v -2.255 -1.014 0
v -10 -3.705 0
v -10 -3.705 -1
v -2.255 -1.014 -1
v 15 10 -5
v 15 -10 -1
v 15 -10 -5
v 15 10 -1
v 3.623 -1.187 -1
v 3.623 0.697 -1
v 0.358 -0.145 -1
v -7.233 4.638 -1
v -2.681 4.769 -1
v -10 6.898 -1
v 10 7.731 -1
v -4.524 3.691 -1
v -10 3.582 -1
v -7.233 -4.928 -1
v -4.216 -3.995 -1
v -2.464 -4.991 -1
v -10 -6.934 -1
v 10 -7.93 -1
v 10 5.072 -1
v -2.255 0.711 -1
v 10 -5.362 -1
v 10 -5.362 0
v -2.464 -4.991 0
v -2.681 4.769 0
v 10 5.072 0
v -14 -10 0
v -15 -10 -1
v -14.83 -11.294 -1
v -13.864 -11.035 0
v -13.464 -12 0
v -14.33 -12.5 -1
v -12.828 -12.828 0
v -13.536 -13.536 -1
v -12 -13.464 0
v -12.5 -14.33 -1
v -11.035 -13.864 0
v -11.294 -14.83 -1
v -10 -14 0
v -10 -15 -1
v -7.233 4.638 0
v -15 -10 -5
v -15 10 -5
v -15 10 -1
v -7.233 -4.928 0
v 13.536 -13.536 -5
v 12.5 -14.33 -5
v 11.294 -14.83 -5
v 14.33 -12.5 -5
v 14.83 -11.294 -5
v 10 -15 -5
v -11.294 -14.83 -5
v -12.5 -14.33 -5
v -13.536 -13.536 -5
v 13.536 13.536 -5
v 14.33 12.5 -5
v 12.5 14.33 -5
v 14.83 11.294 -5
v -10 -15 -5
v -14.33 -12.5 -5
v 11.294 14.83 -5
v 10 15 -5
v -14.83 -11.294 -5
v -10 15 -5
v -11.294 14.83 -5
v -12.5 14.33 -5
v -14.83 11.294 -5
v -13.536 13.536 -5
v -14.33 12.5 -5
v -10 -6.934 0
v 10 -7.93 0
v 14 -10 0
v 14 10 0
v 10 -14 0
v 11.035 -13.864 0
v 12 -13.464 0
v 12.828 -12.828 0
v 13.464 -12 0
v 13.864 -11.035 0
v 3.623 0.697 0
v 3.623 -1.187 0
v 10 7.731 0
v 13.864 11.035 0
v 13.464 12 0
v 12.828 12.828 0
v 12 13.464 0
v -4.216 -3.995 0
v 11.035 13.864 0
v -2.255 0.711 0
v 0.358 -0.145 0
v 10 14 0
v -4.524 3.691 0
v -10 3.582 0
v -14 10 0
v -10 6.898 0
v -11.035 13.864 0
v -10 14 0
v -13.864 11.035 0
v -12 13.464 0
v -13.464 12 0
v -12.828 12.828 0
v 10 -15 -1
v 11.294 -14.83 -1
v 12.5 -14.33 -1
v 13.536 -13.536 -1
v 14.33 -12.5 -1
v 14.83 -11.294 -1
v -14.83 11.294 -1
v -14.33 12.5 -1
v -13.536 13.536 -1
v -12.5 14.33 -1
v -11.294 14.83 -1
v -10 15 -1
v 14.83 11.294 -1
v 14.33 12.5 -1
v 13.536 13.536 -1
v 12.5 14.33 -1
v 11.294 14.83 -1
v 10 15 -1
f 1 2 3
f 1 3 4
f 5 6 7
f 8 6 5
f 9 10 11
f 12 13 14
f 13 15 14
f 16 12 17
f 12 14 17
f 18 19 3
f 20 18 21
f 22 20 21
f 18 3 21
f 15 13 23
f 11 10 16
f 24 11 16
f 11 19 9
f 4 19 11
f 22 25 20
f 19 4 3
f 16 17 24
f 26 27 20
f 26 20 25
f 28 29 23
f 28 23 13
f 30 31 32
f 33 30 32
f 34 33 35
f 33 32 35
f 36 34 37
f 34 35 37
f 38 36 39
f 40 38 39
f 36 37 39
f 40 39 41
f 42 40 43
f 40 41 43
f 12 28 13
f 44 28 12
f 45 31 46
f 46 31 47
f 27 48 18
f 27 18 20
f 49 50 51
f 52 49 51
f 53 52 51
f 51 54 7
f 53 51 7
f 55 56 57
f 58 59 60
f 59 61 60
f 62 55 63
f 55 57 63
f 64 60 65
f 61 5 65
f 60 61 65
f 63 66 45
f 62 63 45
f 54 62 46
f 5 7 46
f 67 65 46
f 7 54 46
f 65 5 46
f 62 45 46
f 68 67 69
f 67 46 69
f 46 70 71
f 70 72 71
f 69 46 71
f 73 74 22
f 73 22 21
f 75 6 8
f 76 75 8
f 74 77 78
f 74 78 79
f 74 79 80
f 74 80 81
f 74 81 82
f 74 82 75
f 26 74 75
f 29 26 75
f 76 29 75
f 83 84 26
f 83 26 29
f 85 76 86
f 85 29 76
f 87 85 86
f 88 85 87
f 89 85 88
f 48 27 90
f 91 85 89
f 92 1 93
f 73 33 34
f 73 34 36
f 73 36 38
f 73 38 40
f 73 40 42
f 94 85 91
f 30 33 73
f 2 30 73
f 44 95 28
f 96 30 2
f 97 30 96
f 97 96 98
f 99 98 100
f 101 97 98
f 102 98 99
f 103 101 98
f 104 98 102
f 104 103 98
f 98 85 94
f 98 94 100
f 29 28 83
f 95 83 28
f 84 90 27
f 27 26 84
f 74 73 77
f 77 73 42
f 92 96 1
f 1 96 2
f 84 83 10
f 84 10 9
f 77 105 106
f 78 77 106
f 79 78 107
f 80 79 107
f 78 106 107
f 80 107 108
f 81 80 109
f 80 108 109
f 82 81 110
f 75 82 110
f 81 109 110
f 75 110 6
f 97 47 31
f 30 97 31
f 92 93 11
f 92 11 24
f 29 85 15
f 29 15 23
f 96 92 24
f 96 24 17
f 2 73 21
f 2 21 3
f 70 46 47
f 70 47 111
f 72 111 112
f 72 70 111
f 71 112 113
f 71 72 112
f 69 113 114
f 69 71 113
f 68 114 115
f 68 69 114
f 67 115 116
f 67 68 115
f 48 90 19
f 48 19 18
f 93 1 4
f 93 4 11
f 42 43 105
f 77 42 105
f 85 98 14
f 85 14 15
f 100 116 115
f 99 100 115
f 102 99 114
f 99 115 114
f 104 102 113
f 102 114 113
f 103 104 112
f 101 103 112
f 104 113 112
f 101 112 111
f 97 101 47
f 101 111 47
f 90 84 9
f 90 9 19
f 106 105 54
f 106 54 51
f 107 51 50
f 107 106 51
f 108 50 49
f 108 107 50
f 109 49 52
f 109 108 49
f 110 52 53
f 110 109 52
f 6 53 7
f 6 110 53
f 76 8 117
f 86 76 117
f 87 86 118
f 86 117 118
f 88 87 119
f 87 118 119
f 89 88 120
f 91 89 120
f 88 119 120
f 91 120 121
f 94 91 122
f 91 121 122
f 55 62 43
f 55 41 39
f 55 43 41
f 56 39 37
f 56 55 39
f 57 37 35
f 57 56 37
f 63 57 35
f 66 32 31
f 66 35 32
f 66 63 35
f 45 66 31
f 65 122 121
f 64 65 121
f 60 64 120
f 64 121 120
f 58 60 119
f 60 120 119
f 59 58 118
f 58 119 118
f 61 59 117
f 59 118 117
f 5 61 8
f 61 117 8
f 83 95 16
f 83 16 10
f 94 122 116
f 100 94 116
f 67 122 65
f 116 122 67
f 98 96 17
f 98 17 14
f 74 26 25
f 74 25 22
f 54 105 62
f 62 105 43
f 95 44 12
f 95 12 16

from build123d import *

# Parameters (mm, degrees)
SKETCH1_W             = 30
SKETCH1_H             = 30
BOSS_EXTRUDE1_DEPTH   = 5
SKETCH1_3_OUTSIDE_W   = 40.544
SKETCH1_3_OUTSIDE_H   = 40.544
SKETCH1_3_OUTSIDE_W_2 = 30
SKETCH1_3_OUTSIDE_H_2 = 30
CUT_EXTRUDE1_DEPTH    = 1
FILLET1_R             = 5
CHAMFER1_SIZE         = 1


with BuildPart() as part:
    # Sketch1 → Boss-Extrude1 (new body)
    with BuildSketch(Plane(origin=(0, 0, 0), x_dir=(0, 1, 0), z_dir=(0, 0, 1))):
        Rectangle(SKETCH1_W, SKETCH1_H)
    extrude(amount=-BOSS_EXTRUDE1_DEPTH)

    # Sketch1<3> outside → Cut-Extrude1 (cut)
    # profile 1 of 2: a face of its own
    with BuildSketch(Plane(origin=(0, 0, 0), x_dir=(0, 1, 0), z_dir=(0, 0, 1))):
        Rectangle(SKETCH1_3_OUTSIDE_W, SKETCH1_3_OUTSIDE_H)
        Rectangle(SKETCH1_3_OUTSIDE_W_2, SKETCH1_3_OUTSIDE_H_2, mode=Mode.SUBTRACT)
    # profile 2 of 2: a face of its own
    with BuildSketch(Plane(origin=(0, 0, 0), x_dir=(0, 1, 0), z_dir=(0, 0, 1))):
        Polygon((7.730978261, -10), (5.072463768, -10), (4.769021739, 2.68115942), (4.637681159, 7.232789855), (3.691123188, 4.524456522), (0.697463768, -3.623188406), (-1.186594203, -3.623188406), (-3.994565217, 4.216485507), (-4.927536232, 7.232789855), (-4.990942029, 2.463768116), (-5.362318841, -10), (-7.930253623, -10), (-6.933876812, 10), (-3.704710145, 10), (-1.014492754, 2.255434783), (-0.144927536, -0.357789855), (0.711050725, 2.255434783), (3.582427536, 10), (6.897644928, 10), align=None)
    extrude(amount=-CUT_EXTRUDE1_DEPTH, mode=Mode.SUBTRACT)

    # Fillet1
    fillet1_edges = [part.edges().sort_by_distance(p)[0] for p in [
        (15, 15, -2.5),
        (-15, 15, -2.5),
        (-15, -15, -2.5),
        (15, -15, -2.5),
    ]]
    fillet(fillet1_edges, radius=FILLET1_R)

    # Chamfer1
    chamfer1_edges = [part.edges().sort_by_distance(p)[0] for p in [
        (0, 15, 0),
        (15, 0, 0),
        (-15, 0, 0),
        (0, -15, 0),
        (-13.535533906, -13.535533906, 0),
        (13.535533906, -13.535533906, 0),
        (13.535533906, 13.535533906, 0),
        (-13.535533906, 13.535533906, 0),
    ]]
    chamfer(chamfer1_edges, length=CHAMFER1_SIZE)


solid = part.part
